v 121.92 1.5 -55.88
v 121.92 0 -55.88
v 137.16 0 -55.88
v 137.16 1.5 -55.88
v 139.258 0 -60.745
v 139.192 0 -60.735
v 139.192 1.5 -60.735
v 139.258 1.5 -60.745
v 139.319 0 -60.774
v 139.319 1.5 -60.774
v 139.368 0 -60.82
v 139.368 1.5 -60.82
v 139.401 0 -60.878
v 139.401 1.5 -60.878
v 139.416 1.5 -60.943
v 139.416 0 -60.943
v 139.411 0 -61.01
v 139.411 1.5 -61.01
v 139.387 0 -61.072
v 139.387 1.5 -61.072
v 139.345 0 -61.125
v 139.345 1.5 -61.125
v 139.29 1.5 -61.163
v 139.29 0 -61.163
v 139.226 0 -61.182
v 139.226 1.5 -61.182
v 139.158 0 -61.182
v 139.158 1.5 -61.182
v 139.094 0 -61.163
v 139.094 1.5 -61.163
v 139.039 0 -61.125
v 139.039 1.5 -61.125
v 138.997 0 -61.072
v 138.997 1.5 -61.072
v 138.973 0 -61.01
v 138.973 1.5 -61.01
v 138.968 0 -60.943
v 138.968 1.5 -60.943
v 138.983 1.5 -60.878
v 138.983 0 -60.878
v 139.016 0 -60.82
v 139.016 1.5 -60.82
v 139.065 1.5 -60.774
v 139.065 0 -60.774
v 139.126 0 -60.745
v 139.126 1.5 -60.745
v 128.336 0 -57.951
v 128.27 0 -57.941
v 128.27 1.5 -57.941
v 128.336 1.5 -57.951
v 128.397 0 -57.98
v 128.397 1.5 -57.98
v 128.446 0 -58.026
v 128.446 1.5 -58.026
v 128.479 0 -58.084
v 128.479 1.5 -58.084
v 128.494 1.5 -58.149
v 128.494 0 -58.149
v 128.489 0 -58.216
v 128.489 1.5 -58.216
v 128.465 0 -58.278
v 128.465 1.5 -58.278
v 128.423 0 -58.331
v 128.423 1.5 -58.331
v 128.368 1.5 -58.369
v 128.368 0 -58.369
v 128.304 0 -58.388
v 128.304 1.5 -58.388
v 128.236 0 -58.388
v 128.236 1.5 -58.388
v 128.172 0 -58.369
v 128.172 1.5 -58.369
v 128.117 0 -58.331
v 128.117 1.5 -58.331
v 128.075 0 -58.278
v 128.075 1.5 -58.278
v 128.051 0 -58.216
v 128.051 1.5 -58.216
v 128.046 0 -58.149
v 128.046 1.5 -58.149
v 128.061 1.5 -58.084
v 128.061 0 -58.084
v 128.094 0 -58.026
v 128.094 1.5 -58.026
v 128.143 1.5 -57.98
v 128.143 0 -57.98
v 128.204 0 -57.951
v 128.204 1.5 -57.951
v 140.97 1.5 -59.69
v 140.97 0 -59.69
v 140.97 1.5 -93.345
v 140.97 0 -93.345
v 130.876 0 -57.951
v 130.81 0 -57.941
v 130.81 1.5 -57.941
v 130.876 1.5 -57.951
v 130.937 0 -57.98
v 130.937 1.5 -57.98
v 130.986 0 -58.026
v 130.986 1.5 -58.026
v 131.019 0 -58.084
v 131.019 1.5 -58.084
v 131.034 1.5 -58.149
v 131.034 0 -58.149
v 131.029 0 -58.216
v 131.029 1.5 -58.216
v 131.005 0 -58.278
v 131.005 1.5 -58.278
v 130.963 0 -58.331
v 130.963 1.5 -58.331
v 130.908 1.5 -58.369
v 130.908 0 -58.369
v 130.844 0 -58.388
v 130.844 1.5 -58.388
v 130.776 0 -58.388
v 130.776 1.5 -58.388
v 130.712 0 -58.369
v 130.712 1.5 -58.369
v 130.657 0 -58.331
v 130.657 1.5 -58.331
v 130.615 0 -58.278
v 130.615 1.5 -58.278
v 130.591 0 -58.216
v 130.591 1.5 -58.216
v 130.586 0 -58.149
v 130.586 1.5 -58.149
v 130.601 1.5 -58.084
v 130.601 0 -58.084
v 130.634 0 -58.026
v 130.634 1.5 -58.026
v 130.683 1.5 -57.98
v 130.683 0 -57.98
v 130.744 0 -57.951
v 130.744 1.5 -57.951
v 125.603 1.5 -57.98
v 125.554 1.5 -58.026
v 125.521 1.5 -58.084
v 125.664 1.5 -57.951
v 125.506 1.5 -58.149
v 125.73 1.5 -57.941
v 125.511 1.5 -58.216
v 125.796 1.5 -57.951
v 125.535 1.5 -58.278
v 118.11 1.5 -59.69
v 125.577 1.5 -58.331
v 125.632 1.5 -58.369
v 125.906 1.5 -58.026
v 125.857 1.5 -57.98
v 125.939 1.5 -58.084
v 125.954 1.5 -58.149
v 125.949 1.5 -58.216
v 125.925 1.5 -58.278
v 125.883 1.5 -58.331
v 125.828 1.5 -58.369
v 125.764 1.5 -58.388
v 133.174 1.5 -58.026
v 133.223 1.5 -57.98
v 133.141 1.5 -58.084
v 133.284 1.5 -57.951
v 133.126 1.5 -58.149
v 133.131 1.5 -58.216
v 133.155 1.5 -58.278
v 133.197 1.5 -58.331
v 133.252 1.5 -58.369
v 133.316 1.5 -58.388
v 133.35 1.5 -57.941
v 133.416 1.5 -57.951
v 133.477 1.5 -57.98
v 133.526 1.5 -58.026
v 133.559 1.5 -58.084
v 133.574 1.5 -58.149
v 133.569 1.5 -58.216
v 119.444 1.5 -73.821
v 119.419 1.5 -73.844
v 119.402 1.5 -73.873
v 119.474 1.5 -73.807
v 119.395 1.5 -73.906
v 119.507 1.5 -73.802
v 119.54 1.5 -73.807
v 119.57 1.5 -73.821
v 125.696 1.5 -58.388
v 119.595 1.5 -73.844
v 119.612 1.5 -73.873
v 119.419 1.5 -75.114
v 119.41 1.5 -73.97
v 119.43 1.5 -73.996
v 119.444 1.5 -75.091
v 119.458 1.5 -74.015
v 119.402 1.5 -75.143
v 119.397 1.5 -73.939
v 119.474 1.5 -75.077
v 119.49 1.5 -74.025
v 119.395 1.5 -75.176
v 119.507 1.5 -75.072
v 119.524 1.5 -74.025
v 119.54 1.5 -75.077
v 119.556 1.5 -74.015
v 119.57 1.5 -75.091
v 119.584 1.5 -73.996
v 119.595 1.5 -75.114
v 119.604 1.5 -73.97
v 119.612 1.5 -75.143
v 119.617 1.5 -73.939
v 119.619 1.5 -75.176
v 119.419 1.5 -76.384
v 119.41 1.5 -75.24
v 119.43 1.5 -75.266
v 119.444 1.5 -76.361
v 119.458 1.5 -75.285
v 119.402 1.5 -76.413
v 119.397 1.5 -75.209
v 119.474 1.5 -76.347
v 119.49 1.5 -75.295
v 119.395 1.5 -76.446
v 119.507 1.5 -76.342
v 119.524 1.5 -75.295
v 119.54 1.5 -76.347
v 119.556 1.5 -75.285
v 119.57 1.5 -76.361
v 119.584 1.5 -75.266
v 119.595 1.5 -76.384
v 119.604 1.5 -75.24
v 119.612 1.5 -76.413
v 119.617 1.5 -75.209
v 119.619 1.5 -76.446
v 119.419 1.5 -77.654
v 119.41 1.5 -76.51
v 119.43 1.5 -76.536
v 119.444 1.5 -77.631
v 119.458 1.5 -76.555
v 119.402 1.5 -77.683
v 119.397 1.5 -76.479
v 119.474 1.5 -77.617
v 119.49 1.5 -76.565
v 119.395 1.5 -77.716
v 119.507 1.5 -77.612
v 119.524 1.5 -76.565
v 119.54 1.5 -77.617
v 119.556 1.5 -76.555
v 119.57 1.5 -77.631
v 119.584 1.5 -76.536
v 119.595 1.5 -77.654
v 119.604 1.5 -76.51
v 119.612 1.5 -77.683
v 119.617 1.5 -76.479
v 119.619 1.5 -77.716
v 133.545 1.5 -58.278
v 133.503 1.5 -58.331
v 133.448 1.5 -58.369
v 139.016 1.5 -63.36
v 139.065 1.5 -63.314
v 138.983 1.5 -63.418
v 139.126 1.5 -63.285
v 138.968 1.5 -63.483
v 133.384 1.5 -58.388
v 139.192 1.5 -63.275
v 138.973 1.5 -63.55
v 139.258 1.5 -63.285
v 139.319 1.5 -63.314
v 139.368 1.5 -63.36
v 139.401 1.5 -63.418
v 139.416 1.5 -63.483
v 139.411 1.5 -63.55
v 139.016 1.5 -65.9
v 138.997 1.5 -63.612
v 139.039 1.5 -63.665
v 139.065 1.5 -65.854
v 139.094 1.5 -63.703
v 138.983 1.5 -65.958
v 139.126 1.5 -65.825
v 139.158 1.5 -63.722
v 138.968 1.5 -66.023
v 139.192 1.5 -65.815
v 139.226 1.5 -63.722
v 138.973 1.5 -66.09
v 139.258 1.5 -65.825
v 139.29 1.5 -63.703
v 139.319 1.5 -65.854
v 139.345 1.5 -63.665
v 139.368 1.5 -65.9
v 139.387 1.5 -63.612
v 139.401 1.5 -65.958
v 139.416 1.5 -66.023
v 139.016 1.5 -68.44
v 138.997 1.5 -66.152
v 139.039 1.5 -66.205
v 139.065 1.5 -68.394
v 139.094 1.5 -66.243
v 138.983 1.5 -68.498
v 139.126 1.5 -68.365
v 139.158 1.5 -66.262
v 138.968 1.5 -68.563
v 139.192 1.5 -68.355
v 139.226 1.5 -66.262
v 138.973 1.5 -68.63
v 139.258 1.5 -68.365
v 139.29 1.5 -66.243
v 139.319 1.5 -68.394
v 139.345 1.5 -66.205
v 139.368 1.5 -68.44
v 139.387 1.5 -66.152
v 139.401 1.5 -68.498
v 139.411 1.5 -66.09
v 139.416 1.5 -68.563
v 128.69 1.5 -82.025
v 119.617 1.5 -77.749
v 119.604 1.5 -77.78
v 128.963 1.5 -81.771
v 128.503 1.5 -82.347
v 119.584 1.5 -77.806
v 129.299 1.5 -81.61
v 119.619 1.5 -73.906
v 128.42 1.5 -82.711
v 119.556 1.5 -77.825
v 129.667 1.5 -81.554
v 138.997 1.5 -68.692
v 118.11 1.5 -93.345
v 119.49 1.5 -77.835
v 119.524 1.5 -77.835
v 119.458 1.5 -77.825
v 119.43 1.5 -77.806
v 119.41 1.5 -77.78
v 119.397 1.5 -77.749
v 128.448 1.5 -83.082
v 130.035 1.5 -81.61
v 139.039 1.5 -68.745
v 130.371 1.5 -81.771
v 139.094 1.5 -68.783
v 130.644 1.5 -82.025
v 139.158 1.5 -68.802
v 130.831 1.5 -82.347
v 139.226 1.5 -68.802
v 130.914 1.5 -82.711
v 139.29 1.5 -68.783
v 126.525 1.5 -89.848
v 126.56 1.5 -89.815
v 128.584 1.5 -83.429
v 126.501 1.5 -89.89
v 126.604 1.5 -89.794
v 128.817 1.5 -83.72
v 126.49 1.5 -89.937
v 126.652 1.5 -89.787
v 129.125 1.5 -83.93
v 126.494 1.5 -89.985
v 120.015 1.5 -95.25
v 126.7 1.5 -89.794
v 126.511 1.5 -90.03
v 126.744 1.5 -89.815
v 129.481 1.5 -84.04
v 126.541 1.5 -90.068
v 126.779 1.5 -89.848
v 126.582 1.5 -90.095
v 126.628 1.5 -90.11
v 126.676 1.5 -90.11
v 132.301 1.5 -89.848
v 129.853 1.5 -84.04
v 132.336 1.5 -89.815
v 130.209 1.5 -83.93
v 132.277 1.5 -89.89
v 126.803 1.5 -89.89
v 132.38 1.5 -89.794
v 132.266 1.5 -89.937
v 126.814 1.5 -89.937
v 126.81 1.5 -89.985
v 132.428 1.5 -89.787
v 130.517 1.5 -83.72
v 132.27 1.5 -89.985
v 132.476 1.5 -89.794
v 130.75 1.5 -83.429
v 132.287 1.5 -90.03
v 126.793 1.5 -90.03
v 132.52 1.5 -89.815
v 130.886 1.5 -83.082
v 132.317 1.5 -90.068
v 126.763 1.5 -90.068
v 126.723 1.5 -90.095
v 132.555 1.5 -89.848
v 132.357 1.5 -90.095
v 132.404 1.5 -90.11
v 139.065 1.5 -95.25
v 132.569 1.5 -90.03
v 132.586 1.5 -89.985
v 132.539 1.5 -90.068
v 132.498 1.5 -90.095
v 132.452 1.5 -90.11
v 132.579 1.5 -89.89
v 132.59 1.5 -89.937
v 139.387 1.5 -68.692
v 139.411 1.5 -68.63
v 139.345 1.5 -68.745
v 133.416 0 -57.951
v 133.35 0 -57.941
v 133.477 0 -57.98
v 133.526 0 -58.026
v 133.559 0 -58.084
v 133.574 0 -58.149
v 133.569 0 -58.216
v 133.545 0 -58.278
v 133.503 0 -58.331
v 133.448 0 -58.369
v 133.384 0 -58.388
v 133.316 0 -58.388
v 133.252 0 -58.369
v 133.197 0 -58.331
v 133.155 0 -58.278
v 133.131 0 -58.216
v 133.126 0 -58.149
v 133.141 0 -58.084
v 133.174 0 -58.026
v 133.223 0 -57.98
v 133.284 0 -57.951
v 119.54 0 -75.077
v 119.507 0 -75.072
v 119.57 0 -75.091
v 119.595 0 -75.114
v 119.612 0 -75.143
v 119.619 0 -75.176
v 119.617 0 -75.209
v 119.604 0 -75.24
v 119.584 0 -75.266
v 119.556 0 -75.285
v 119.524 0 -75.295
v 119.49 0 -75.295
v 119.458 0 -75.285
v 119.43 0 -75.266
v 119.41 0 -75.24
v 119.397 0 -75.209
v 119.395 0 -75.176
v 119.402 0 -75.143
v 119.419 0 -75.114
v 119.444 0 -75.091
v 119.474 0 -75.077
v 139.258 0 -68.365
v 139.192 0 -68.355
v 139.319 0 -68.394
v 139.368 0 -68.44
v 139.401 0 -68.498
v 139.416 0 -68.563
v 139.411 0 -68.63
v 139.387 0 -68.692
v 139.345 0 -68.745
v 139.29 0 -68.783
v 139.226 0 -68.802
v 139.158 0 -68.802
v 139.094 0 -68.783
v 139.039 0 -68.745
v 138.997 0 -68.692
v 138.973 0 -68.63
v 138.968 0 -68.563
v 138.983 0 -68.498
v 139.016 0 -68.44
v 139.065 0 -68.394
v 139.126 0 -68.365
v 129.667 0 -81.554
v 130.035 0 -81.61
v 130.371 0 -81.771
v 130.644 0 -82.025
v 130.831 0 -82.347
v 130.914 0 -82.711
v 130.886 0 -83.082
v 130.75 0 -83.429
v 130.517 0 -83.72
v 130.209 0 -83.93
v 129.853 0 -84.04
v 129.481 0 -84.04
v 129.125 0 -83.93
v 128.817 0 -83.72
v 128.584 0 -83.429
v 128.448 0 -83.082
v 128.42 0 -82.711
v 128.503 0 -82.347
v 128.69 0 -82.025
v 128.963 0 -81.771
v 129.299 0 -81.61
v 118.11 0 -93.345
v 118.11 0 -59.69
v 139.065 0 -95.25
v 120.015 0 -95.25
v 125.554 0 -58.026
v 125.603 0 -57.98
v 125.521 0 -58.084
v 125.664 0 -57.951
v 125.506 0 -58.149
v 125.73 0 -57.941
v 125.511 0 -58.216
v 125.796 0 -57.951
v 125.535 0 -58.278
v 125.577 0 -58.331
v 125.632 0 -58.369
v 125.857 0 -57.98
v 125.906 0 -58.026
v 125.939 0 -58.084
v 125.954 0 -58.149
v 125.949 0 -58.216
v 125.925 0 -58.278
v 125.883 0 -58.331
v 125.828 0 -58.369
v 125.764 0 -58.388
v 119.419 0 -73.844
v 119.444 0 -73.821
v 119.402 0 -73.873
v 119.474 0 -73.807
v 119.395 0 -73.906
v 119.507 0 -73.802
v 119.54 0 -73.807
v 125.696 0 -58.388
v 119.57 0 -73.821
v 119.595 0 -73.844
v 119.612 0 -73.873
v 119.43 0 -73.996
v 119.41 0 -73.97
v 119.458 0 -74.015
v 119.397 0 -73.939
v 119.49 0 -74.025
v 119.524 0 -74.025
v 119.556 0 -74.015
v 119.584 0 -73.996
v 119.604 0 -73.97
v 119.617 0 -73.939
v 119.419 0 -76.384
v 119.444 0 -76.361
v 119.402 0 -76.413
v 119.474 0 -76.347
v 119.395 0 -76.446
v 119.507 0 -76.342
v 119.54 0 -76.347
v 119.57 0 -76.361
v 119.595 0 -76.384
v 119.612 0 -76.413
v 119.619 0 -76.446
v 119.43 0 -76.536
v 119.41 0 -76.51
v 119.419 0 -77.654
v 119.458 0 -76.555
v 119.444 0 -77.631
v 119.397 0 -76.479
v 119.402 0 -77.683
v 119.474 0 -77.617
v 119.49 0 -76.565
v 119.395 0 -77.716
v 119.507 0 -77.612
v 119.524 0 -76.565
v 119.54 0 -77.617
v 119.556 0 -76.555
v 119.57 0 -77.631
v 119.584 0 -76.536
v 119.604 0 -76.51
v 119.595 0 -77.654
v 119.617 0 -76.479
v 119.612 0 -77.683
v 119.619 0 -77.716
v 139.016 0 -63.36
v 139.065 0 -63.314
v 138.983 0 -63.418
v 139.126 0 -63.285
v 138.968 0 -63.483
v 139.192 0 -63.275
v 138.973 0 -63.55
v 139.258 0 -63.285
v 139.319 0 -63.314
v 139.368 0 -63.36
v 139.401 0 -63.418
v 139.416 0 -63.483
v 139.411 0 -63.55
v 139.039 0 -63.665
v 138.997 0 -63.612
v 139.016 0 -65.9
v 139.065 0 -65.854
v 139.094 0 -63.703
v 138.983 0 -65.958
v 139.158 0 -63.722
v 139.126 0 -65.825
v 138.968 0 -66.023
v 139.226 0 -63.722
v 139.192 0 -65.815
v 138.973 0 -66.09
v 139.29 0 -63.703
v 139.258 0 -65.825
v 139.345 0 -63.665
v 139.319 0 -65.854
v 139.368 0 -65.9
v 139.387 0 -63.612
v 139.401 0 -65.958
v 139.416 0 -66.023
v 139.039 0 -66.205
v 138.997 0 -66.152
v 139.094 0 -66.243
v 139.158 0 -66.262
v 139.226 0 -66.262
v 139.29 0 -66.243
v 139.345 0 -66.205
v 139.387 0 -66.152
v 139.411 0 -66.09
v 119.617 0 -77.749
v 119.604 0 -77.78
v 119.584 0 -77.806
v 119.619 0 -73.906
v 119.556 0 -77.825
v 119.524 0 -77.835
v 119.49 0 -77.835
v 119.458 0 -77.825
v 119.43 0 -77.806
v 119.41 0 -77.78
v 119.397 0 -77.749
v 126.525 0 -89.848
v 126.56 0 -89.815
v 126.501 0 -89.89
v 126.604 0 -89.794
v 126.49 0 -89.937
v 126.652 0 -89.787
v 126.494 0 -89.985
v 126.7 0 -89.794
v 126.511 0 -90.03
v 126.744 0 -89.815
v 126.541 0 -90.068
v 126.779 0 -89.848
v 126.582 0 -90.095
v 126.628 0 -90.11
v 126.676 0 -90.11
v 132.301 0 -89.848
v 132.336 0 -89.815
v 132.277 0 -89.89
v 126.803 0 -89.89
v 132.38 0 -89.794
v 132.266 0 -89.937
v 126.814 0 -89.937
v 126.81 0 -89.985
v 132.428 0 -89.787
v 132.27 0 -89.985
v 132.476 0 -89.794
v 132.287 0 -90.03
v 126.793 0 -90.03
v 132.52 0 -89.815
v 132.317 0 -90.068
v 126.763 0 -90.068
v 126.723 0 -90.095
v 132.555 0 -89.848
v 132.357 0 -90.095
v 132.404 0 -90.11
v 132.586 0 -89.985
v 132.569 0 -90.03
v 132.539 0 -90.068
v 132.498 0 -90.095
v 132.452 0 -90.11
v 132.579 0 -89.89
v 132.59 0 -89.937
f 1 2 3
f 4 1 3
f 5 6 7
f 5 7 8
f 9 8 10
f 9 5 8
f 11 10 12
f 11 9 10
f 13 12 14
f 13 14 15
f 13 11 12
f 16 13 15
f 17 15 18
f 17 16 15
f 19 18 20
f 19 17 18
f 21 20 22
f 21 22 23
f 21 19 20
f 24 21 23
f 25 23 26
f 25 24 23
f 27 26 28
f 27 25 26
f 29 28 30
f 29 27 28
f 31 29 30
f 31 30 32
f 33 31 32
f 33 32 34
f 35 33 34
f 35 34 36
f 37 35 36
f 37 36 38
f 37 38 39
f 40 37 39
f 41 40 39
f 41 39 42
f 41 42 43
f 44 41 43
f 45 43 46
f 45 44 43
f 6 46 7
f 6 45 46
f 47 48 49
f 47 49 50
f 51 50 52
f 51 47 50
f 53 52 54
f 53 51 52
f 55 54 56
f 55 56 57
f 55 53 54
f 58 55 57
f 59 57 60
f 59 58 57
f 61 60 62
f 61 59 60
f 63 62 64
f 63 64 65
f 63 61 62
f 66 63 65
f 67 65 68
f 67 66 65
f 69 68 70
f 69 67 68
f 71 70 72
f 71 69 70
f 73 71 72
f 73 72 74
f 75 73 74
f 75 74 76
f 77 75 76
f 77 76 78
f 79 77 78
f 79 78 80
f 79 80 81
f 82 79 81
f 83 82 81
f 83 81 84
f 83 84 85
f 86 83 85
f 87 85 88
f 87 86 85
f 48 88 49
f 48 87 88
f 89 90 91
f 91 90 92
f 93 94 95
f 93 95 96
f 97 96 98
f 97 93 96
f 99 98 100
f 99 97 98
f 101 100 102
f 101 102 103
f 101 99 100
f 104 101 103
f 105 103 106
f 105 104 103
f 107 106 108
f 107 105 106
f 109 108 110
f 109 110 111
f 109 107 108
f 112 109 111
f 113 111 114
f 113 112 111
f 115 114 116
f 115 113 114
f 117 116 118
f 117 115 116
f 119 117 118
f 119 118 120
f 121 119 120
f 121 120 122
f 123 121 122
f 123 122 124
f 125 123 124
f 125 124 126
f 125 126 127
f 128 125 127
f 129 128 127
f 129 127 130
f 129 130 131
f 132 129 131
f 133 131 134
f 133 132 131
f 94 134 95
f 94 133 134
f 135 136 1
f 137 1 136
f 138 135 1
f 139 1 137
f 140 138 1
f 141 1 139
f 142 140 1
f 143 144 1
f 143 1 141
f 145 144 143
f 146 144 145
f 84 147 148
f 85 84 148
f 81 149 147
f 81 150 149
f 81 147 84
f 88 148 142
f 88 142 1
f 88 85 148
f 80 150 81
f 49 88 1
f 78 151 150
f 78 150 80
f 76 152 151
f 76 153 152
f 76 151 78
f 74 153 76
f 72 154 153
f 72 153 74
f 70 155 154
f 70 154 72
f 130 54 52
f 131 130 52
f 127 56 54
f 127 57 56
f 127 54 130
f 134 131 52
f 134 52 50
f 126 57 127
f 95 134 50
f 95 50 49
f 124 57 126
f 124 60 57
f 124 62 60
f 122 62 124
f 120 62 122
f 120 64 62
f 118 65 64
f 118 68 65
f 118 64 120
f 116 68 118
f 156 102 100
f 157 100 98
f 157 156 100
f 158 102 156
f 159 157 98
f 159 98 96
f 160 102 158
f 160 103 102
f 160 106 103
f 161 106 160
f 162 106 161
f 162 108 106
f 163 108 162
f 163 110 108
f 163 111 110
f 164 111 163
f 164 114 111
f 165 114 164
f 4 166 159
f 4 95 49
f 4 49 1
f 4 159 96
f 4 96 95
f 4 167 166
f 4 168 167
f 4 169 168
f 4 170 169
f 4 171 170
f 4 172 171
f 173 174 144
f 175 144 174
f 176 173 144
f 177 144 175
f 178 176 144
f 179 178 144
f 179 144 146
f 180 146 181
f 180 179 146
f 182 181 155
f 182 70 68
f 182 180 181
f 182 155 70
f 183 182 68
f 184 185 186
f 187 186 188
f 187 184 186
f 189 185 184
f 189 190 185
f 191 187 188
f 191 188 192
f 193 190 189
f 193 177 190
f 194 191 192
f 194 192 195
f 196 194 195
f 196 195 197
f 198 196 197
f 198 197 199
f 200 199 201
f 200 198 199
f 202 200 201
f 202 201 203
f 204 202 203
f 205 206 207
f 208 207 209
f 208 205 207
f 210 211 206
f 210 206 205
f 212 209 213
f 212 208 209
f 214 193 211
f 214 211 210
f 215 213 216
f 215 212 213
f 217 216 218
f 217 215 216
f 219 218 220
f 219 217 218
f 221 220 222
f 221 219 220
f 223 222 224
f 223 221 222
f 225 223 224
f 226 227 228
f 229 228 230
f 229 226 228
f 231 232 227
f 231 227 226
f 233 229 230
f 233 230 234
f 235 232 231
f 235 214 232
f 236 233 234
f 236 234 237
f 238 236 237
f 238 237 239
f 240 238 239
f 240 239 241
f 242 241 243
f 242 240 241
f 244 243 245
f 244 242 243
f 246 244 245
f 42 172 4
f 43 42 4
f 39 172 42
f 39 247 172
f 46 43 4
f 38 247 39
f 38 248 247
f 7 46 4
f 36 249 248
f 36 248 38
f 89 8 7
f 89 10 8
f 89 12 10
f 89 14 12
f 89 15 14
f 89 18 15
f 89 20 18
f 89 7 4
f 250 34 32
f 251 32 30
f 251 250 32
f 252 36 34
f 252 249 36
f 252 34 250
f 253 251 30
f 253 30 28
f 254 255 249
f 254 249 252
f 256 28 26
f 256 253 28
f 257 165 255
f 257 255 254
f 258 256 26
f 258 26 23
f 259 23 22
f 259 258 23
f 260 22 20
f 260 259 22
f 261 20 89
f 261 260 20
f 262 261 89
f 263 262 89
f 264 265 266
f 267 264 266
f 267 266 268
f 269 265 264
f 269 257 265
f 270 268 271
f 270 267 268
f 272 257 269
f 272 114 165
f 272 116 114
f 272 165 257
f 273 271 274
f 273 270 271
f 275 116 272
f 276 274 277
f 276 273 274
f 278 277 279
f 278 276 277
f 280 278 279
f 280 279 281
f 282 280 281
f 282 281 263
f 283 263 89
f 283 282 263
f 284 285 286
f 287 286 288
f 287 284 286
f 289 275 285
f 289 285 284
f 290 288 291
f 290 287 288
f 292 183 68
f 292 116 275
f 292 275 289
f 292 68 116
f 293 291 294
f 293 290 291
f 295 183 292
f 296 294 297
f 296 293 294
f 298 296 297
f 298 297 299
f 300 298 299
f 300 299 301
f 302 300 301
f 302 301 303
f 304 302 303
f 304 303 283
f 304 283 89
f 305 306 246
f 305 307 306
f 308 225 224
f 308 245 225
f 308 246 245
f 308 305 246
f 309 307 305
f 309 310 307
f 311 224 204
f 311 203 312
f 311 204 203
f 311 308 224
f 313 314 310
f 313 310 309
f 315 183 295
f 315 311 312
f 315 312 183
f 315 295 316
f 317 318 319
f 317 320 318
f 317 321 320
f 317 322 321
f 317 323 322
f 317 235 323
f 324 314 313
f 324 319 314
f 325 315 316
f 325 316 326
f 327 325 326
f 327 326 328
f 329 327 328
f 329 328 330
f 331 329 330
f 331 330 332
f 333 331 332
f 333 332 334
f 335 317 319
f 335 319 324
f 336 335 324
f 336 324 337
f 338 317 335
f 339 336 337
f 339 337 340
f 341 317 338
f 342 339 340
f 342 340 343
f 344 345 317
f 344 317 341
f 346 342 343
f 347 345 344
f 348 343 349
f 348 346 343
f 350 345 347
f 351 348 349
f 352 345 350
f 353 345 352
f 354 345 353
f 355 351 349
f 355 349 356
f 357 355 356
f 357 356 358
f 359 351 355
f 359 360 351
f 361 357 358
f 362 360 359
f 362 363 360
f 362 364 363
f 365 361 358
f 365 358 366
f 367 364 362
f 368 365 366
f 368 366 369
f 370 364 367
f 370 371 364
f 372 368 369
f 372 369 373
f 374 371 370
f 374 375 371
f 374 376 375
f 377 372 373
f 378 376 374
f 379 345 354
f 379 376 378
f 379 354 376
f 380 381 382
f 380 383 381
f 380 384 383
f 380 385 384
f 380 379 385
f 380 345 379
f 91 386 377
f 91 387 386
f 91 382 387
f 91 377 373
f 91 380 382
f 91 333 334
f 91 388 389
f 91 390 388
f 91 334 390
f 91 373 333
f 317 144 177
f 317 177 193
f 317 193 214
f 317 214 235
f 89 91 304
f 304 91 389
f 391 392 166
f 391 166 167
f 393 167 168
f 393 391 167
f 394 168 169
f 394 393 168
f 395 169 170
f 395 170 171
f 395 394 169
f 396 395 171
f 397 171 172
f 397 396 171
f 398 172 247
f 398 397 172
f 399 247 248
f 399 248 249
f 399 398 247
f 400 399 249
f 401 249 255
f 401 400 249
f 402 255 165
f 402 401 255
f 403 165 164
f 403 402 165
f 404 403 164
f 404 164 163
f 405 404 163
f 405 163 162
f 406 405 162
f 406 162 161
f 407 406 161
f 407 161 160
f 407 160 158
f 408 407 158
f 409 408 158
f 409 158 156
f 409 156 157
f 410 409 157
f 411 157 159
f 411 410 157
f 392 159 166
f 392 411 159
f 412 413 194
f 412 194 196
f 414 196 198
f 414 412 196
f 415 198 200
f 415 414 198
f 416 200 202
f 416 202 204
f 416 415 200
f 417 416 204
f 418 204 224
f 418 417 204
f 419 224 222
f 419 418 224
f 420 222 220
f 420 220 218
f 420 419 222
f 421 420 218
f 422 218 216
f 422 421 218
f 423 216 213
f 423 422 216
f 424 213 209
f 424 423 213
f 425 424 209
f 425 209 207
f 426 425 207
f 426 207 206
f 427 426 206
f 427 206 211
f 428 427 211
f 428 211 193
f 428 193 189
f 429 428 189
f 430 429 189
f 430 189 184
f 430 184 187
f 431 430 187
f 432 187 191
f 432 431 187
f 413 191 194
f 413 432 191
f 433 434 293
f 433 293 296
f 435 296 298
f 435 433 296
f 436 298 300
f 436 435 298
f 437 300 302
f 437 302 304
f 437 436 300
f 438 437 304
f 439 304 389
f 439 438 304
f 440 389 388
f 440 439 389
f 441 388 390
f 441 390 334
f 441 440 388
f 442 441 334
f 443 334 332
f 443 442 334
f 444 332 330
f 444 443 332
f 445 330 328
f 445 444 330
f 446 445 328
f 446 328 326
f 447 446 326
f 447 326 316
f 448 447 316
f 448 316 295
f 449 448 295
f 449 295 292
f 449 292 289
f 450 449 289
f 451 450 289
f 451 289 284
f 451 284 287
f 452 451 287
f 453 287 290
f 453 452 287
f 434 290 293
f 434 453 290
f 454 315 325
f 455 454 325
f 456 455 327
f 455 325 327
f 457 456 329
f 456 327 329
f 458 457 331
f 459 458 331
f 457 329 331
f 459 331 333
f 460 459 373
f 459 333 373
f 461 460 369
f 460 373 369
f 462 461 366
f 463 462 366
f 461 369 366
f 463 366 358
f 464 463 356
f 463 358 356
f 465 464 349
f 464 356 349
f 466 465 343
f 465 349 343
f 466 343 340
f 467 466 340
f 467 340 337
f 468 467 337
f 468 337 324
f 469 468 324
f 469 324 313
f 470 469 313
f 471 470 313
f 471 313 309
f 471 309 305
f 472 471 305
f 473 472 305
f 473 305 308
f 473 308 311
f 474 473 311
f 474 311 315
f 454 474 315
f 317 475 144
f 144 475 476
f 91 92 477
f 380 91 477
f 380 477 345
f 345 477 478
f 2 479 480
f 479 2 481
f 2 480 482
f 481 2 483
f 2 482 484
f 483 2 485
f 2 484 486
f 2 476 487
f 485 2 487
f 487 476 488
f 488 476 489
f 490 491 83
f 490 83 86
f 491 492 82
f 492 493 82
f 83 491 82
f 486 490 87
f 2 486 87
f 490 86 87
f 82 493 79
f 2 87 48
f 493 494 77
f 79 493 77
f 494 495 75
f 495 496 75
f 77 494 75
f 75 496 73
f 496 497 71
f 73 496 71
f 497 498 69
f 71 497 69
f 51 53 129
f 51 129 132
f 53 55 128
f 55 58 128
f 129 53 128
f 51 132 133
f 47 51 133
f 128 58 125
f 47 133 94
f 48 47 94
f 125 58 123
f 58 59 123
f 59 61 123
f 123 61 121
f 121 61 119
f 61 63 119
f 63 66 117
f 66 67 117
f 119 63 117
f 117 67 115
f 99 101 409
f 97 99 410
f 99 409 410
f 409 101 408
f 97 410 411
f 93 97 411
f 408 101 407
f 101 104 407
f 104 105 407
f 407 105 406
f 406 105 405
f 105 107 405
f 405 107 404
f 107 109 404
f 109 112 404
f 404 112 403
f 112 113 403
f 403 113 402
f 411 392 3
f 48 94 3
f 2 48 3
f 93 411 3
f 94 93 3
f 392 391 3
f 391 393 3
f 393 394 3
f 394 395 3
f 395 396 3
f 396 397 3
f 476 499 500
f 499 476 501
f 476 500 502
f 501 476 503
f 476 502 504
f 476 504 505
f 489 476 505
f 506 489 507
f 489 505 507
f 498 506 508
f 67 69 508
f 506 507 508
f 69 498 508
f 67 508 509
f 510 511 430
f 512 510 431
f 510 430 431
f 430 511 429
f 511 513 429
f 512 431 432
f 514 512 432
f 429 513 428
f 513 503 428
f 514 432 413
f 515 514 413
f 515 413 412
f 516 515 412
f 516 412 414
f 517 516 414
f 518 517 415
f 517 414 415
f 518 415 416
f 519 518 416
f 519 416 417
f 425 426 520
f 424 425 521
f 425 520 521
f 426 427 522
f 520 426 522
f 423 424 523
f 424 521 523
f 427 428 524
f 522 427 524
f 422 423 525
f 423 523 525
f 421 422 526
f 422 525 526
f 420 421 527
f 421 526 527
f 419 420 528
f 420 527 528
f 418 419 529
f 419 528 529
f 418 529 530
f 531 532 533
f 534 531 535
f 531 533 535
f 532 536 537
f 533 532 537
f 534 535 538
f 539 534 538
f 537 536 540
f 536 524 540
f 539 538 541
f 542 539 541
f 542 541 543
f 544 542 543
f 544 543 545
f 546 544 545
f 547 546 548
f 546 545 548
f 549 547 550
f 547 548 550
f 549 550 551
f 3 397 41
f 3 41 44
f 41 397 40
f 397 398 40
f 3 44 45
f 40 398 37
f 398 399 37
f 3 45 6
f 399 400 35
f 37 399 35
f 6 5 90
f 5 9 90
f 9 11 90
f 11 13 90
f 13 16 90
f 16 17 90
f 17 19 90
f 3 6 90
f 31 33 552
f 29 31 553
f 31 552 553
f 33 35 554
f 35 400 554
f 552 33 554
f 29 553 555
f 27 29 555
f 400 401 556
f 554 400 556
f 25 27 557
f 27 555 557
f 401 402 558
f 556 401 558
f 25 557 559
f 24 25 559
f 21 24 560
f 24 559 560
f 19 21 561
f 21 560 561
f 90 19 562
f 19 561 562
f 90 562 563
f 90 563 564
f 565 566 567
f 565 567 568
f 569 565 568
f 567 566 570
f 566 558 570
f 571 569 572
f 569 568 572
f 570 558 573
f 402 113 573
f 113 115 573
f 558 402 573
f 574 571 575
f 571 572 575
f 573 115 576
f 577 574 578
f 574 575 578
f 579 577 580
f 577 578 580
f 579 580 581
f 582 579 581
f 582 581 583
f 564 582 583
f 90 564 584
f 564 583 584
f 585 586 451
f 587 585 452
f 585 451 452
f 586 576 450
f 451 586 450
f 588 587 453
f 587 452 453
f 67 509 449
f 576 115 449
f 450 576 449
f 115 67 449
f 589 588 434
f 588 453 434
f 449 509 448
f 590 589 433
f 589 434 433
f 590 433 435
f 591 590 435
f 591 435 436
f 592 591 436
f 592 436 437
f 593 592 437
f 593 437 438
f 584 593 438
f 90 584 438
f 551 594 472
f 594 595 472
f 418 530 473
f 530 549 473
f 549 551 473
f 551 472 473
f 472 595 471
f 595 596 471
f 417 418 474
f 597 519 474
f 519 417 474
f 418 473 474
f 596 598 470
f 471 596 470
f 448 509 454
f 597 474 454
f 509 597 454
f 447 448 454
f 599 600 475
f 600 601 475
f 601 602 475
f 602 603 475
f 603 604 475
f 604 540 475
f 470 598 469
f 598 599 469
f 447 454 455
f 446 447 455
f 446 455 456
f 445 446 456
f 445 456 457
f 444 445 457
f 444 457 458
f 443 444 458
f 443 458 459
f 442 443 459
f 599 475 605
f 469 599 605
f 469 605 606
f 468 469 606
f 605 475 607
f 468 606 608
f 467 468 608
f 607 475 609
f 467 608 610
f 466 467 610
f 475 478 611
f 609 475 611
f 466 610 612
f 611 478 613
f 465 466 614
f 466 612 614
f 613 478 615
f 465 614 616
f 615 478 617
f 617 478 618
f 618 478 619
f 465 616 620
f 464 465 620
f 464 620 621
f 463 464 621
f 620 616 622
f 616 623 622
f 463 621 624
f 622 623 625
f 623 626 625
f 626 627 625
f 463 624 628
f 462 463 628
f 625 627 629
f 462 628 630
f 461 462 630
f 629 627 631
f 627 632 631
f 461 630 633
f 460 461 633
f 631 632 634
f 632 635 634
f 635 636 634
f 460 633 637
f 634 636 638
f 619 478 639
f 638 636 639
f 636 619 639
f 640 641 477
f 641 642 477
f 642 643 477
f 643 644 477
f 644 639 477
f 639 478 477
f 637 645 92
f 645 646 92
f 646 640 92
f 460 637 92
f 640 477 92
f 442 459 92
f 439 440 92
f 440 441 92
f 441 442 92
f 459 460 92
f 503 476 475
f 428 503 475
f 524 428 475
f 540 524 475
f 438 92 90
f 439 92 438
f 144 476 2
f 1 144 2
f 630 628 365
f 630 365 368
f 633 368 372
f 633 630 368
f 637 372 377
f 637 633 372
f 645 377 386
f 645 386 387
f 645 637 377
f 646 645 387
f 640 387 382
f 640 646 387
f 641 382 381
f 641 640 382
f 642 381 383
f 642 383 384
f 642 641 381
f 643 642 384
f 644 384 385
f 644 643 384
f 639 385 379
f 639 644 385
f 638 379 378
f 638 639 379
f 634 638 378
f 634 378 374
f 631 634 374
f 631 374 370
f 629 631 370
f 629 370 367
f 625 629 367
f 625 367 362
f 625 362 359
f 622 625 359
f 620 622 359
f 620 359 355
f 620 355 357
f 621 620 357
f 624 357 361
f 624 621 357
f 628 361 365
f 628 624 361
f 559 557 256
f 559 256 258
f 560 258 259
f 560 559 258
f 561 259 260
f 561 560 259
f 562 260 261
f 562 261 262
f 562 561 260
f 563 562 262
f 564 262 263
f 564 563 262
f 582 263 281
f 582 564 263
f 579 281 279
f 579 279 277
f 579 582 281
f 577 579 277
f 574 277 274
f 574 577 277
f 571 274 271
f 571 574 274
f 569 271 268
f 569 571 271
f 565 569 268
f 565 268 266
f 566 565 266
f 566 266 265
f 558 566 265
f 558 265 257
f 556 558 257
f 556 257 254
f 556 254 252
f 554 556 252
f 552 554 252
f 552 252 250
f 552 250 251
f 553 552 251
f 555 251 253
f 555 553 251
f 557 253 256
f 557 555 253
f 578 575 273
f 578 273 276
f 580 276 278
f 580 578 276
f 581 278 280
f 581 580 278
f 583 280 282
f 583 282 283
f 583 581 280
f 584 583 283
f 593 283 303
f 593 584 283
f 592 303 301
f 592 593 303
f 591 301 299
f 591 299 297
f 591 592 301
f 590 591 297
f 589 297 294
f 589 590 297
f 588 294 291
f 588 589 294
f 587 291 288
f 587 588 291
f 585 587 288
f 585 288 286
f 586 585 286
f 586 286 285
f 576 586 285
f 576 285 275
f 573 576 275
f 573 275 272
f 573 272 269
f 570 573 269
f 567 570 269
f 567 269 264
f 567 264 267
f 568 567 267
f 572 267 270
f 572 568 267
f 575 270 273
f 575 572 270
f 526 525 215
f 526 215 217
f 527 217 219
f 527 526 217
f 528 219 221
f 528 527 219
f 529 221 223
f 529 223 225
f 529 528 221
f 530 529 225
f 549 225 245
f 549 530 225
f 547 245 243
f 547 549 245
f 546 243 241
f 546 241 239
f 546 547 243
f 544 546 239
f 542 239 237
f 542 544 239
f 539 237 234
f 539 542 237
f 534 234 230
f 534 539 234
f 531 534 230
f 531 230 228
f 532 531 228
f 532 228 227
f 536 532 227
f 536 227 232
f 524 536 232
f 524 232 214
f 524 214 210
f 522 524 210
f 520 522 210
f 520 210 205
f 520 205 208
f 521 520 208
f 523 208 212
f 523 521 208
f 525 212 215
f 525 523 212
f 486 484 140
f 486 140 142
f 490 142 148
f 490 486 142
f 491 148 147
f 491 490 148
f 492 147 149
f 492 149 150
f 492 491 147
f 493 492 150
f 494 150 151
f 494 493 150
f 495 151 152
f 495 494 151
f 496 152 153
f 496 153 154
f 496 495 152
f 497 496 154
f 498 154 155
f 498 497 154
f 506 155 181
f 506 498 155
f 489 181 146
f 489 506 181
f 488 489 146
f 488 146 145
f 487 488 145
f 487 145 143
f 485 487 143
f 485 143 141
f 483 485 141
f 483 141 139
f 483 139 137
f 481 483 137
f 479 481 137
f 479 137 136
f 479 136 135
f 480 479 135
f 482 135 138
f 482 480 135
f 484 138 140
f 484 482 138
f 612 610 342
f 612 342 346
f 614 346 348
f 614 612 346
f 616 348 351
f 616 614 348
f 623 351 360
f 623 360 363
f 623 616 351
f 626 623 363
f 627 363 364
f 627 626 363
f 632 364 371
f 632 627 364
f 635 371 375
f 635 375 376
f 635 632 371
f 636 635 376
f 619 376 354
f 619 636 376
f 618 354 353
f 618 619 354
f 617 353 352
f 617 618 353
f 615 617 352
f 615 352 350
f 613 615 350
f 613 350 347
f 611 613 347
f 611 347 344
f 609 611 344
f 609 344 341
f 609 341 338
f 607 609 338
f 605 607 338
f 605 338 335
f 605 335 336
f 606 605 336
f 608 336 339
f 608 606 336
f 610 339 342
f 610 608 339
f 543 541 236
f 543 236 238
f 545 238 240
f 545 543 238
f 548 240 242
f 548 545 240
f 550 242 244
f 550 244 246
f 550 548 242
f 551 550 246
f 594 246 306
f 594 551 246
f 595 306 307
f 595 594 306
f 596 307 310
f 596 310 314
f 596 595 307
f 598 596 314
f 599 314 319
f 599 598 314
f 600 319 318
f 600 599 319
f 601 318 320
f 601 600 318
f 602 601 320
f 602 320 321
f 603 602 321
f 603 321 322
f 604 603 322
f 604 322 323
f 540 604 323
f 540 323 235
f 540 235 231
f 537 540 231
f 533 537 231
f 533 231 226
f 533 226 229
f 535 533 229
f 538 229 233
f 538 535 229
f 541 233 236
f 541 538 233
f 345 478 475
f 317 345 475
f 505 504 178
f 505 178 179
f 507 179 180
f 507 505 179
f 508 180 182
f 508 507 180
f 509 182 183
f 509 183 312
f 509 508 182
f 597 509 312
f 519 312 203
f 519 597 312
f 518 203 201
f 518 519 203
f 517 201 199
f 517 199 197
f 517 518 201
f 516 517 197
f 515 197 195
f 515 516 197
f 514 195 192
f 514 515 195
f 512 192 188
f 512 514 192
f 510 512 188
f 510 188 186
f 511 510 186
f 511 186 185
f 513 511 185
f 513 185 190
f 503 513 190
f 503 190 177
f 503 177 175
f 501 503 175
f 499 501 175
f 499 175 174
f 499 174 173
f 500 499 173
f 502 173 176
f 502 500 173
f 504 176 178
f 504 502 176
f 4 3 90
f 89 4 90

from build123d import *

# Parameters (mm, degrees)
SKETCH_1_R          = 0.1625092
SKETCH_1_R_2        = 0.2249932
SKETCH_1_R_3        = 0.1124966
EXTRUDE_1_DEPTH     = 1.5
SKETCH_2_R          = 1.25
CUT_EXTRUDE_1_DEPTH = 171.139217701


with BuildPart() as part:
    # 草图1 → 凸台-拉伸1 (new body)
    with BuildSketch(Plane(origin=(0, 0, 0), x_dir=(1, 0, 0), z_dir=(0, 1, 0))):
        Polygon((139.065, 95.25), (120.015, 95.25), (118.11, 93.345), (118.11, 59.69), (121.92, 55.88), (137.16, 55.88), (140.97, 59.69), (140.97, 93.345), align=None)
        with Locations(Location((126.65202, 89.94902, 0), (0, 0, 270))):
            Circle(SKETCH_1_R, mode=Mode.SUBTRACT)
        with Locations(Location((132.42798, 89.94902, 0), (0, 0, 270))):
            Circle(SKETCH_1_R, mode=Mode.SUBTRACT)
        with Locations(Location((133.35, 58.166, 0), (0, 0, 270))):
            Circle(SKETCH_1_R_2, mode=Mode.SUBTRACT)
        with Locations(Location((130.81, 58.166, 0), (0, 0, 270))):
            Circle(SKETCH_1_R_2, mode=Mode.SUBTRACT)
        with Locations(Location((128.27, 58.166, 0), (0, 0, 270))):
            Circle(SKETCH_1_R_2, mode=Mode.SUBTRACT)
        with Locations(Location((125.73, 58.166, 0), (0, 0, 270))):
            Circle(SKETCH_1_R_2, mode=Mode.SUBTRACT)
        with Locations(Location((139.192, 68.58, 0), (0, 0, 270))):
            Circle(SKETCH_1_R_2, mode=Mode.SUBTRACT)
        with Locations(Location((139.192, 66.04, 0), (0, 0, 270))):
            Circle(SKETCH_1_R_2, mode=Mode.SUBTRACT)
        with Locations(Location((139.192, 63.5, 0), (0, 0, 270))):
            Circle(SKETCH_1_R_2, mode=Mode.SUBTRACT)
        with Locations(Location((139.192, 60.96, 0), (0, 0, 270))):
            Circle(SKETCH_1_R_2, mode=Mode.SUBTRACT)
        with Locations(Location((119.507, 77.724, 0), (0, 0, 270))):
            Circle(SKETCH_1_R_3, mode=Mode.SUBTRACT)
        with Locations(Location((119.507, 76.454, 0), (0, 0, 270))):
            Circle(SKETCH_1_R_3, mode=Mode.SUBTRACT)
        with Locations(Location((119.507, 73.914, 0), (0, 0, 270))):
            Circle(SKETCH_1_R_3, mode=Mode.SUBTRACT)
        with Locations(Location((119.507, 75.184, 0), (0, 0, 270))):
            Circle(SKETCH_1_R_3, mode=Mode.SUBTRACT)
    extrude(amount=EXTRUDE_1_DEPTH)

    # 草图2 → 切除-拉伸1 (cut, through all)
    with BuildSketch(Plane(origin=(0, 1.5, 0), x_dir=(1, 0, 0), z_dir=(0, 1, 0))):
        with Locations(Location((129.667, 82.804, 0), (0, 0, 270))):
            Circle(SKETCH_2_R)
    extrude(amount=-CUT_EXTRUDE_1_DEPTH, mode=Mode.SUBTRACT)


solid = part.part
